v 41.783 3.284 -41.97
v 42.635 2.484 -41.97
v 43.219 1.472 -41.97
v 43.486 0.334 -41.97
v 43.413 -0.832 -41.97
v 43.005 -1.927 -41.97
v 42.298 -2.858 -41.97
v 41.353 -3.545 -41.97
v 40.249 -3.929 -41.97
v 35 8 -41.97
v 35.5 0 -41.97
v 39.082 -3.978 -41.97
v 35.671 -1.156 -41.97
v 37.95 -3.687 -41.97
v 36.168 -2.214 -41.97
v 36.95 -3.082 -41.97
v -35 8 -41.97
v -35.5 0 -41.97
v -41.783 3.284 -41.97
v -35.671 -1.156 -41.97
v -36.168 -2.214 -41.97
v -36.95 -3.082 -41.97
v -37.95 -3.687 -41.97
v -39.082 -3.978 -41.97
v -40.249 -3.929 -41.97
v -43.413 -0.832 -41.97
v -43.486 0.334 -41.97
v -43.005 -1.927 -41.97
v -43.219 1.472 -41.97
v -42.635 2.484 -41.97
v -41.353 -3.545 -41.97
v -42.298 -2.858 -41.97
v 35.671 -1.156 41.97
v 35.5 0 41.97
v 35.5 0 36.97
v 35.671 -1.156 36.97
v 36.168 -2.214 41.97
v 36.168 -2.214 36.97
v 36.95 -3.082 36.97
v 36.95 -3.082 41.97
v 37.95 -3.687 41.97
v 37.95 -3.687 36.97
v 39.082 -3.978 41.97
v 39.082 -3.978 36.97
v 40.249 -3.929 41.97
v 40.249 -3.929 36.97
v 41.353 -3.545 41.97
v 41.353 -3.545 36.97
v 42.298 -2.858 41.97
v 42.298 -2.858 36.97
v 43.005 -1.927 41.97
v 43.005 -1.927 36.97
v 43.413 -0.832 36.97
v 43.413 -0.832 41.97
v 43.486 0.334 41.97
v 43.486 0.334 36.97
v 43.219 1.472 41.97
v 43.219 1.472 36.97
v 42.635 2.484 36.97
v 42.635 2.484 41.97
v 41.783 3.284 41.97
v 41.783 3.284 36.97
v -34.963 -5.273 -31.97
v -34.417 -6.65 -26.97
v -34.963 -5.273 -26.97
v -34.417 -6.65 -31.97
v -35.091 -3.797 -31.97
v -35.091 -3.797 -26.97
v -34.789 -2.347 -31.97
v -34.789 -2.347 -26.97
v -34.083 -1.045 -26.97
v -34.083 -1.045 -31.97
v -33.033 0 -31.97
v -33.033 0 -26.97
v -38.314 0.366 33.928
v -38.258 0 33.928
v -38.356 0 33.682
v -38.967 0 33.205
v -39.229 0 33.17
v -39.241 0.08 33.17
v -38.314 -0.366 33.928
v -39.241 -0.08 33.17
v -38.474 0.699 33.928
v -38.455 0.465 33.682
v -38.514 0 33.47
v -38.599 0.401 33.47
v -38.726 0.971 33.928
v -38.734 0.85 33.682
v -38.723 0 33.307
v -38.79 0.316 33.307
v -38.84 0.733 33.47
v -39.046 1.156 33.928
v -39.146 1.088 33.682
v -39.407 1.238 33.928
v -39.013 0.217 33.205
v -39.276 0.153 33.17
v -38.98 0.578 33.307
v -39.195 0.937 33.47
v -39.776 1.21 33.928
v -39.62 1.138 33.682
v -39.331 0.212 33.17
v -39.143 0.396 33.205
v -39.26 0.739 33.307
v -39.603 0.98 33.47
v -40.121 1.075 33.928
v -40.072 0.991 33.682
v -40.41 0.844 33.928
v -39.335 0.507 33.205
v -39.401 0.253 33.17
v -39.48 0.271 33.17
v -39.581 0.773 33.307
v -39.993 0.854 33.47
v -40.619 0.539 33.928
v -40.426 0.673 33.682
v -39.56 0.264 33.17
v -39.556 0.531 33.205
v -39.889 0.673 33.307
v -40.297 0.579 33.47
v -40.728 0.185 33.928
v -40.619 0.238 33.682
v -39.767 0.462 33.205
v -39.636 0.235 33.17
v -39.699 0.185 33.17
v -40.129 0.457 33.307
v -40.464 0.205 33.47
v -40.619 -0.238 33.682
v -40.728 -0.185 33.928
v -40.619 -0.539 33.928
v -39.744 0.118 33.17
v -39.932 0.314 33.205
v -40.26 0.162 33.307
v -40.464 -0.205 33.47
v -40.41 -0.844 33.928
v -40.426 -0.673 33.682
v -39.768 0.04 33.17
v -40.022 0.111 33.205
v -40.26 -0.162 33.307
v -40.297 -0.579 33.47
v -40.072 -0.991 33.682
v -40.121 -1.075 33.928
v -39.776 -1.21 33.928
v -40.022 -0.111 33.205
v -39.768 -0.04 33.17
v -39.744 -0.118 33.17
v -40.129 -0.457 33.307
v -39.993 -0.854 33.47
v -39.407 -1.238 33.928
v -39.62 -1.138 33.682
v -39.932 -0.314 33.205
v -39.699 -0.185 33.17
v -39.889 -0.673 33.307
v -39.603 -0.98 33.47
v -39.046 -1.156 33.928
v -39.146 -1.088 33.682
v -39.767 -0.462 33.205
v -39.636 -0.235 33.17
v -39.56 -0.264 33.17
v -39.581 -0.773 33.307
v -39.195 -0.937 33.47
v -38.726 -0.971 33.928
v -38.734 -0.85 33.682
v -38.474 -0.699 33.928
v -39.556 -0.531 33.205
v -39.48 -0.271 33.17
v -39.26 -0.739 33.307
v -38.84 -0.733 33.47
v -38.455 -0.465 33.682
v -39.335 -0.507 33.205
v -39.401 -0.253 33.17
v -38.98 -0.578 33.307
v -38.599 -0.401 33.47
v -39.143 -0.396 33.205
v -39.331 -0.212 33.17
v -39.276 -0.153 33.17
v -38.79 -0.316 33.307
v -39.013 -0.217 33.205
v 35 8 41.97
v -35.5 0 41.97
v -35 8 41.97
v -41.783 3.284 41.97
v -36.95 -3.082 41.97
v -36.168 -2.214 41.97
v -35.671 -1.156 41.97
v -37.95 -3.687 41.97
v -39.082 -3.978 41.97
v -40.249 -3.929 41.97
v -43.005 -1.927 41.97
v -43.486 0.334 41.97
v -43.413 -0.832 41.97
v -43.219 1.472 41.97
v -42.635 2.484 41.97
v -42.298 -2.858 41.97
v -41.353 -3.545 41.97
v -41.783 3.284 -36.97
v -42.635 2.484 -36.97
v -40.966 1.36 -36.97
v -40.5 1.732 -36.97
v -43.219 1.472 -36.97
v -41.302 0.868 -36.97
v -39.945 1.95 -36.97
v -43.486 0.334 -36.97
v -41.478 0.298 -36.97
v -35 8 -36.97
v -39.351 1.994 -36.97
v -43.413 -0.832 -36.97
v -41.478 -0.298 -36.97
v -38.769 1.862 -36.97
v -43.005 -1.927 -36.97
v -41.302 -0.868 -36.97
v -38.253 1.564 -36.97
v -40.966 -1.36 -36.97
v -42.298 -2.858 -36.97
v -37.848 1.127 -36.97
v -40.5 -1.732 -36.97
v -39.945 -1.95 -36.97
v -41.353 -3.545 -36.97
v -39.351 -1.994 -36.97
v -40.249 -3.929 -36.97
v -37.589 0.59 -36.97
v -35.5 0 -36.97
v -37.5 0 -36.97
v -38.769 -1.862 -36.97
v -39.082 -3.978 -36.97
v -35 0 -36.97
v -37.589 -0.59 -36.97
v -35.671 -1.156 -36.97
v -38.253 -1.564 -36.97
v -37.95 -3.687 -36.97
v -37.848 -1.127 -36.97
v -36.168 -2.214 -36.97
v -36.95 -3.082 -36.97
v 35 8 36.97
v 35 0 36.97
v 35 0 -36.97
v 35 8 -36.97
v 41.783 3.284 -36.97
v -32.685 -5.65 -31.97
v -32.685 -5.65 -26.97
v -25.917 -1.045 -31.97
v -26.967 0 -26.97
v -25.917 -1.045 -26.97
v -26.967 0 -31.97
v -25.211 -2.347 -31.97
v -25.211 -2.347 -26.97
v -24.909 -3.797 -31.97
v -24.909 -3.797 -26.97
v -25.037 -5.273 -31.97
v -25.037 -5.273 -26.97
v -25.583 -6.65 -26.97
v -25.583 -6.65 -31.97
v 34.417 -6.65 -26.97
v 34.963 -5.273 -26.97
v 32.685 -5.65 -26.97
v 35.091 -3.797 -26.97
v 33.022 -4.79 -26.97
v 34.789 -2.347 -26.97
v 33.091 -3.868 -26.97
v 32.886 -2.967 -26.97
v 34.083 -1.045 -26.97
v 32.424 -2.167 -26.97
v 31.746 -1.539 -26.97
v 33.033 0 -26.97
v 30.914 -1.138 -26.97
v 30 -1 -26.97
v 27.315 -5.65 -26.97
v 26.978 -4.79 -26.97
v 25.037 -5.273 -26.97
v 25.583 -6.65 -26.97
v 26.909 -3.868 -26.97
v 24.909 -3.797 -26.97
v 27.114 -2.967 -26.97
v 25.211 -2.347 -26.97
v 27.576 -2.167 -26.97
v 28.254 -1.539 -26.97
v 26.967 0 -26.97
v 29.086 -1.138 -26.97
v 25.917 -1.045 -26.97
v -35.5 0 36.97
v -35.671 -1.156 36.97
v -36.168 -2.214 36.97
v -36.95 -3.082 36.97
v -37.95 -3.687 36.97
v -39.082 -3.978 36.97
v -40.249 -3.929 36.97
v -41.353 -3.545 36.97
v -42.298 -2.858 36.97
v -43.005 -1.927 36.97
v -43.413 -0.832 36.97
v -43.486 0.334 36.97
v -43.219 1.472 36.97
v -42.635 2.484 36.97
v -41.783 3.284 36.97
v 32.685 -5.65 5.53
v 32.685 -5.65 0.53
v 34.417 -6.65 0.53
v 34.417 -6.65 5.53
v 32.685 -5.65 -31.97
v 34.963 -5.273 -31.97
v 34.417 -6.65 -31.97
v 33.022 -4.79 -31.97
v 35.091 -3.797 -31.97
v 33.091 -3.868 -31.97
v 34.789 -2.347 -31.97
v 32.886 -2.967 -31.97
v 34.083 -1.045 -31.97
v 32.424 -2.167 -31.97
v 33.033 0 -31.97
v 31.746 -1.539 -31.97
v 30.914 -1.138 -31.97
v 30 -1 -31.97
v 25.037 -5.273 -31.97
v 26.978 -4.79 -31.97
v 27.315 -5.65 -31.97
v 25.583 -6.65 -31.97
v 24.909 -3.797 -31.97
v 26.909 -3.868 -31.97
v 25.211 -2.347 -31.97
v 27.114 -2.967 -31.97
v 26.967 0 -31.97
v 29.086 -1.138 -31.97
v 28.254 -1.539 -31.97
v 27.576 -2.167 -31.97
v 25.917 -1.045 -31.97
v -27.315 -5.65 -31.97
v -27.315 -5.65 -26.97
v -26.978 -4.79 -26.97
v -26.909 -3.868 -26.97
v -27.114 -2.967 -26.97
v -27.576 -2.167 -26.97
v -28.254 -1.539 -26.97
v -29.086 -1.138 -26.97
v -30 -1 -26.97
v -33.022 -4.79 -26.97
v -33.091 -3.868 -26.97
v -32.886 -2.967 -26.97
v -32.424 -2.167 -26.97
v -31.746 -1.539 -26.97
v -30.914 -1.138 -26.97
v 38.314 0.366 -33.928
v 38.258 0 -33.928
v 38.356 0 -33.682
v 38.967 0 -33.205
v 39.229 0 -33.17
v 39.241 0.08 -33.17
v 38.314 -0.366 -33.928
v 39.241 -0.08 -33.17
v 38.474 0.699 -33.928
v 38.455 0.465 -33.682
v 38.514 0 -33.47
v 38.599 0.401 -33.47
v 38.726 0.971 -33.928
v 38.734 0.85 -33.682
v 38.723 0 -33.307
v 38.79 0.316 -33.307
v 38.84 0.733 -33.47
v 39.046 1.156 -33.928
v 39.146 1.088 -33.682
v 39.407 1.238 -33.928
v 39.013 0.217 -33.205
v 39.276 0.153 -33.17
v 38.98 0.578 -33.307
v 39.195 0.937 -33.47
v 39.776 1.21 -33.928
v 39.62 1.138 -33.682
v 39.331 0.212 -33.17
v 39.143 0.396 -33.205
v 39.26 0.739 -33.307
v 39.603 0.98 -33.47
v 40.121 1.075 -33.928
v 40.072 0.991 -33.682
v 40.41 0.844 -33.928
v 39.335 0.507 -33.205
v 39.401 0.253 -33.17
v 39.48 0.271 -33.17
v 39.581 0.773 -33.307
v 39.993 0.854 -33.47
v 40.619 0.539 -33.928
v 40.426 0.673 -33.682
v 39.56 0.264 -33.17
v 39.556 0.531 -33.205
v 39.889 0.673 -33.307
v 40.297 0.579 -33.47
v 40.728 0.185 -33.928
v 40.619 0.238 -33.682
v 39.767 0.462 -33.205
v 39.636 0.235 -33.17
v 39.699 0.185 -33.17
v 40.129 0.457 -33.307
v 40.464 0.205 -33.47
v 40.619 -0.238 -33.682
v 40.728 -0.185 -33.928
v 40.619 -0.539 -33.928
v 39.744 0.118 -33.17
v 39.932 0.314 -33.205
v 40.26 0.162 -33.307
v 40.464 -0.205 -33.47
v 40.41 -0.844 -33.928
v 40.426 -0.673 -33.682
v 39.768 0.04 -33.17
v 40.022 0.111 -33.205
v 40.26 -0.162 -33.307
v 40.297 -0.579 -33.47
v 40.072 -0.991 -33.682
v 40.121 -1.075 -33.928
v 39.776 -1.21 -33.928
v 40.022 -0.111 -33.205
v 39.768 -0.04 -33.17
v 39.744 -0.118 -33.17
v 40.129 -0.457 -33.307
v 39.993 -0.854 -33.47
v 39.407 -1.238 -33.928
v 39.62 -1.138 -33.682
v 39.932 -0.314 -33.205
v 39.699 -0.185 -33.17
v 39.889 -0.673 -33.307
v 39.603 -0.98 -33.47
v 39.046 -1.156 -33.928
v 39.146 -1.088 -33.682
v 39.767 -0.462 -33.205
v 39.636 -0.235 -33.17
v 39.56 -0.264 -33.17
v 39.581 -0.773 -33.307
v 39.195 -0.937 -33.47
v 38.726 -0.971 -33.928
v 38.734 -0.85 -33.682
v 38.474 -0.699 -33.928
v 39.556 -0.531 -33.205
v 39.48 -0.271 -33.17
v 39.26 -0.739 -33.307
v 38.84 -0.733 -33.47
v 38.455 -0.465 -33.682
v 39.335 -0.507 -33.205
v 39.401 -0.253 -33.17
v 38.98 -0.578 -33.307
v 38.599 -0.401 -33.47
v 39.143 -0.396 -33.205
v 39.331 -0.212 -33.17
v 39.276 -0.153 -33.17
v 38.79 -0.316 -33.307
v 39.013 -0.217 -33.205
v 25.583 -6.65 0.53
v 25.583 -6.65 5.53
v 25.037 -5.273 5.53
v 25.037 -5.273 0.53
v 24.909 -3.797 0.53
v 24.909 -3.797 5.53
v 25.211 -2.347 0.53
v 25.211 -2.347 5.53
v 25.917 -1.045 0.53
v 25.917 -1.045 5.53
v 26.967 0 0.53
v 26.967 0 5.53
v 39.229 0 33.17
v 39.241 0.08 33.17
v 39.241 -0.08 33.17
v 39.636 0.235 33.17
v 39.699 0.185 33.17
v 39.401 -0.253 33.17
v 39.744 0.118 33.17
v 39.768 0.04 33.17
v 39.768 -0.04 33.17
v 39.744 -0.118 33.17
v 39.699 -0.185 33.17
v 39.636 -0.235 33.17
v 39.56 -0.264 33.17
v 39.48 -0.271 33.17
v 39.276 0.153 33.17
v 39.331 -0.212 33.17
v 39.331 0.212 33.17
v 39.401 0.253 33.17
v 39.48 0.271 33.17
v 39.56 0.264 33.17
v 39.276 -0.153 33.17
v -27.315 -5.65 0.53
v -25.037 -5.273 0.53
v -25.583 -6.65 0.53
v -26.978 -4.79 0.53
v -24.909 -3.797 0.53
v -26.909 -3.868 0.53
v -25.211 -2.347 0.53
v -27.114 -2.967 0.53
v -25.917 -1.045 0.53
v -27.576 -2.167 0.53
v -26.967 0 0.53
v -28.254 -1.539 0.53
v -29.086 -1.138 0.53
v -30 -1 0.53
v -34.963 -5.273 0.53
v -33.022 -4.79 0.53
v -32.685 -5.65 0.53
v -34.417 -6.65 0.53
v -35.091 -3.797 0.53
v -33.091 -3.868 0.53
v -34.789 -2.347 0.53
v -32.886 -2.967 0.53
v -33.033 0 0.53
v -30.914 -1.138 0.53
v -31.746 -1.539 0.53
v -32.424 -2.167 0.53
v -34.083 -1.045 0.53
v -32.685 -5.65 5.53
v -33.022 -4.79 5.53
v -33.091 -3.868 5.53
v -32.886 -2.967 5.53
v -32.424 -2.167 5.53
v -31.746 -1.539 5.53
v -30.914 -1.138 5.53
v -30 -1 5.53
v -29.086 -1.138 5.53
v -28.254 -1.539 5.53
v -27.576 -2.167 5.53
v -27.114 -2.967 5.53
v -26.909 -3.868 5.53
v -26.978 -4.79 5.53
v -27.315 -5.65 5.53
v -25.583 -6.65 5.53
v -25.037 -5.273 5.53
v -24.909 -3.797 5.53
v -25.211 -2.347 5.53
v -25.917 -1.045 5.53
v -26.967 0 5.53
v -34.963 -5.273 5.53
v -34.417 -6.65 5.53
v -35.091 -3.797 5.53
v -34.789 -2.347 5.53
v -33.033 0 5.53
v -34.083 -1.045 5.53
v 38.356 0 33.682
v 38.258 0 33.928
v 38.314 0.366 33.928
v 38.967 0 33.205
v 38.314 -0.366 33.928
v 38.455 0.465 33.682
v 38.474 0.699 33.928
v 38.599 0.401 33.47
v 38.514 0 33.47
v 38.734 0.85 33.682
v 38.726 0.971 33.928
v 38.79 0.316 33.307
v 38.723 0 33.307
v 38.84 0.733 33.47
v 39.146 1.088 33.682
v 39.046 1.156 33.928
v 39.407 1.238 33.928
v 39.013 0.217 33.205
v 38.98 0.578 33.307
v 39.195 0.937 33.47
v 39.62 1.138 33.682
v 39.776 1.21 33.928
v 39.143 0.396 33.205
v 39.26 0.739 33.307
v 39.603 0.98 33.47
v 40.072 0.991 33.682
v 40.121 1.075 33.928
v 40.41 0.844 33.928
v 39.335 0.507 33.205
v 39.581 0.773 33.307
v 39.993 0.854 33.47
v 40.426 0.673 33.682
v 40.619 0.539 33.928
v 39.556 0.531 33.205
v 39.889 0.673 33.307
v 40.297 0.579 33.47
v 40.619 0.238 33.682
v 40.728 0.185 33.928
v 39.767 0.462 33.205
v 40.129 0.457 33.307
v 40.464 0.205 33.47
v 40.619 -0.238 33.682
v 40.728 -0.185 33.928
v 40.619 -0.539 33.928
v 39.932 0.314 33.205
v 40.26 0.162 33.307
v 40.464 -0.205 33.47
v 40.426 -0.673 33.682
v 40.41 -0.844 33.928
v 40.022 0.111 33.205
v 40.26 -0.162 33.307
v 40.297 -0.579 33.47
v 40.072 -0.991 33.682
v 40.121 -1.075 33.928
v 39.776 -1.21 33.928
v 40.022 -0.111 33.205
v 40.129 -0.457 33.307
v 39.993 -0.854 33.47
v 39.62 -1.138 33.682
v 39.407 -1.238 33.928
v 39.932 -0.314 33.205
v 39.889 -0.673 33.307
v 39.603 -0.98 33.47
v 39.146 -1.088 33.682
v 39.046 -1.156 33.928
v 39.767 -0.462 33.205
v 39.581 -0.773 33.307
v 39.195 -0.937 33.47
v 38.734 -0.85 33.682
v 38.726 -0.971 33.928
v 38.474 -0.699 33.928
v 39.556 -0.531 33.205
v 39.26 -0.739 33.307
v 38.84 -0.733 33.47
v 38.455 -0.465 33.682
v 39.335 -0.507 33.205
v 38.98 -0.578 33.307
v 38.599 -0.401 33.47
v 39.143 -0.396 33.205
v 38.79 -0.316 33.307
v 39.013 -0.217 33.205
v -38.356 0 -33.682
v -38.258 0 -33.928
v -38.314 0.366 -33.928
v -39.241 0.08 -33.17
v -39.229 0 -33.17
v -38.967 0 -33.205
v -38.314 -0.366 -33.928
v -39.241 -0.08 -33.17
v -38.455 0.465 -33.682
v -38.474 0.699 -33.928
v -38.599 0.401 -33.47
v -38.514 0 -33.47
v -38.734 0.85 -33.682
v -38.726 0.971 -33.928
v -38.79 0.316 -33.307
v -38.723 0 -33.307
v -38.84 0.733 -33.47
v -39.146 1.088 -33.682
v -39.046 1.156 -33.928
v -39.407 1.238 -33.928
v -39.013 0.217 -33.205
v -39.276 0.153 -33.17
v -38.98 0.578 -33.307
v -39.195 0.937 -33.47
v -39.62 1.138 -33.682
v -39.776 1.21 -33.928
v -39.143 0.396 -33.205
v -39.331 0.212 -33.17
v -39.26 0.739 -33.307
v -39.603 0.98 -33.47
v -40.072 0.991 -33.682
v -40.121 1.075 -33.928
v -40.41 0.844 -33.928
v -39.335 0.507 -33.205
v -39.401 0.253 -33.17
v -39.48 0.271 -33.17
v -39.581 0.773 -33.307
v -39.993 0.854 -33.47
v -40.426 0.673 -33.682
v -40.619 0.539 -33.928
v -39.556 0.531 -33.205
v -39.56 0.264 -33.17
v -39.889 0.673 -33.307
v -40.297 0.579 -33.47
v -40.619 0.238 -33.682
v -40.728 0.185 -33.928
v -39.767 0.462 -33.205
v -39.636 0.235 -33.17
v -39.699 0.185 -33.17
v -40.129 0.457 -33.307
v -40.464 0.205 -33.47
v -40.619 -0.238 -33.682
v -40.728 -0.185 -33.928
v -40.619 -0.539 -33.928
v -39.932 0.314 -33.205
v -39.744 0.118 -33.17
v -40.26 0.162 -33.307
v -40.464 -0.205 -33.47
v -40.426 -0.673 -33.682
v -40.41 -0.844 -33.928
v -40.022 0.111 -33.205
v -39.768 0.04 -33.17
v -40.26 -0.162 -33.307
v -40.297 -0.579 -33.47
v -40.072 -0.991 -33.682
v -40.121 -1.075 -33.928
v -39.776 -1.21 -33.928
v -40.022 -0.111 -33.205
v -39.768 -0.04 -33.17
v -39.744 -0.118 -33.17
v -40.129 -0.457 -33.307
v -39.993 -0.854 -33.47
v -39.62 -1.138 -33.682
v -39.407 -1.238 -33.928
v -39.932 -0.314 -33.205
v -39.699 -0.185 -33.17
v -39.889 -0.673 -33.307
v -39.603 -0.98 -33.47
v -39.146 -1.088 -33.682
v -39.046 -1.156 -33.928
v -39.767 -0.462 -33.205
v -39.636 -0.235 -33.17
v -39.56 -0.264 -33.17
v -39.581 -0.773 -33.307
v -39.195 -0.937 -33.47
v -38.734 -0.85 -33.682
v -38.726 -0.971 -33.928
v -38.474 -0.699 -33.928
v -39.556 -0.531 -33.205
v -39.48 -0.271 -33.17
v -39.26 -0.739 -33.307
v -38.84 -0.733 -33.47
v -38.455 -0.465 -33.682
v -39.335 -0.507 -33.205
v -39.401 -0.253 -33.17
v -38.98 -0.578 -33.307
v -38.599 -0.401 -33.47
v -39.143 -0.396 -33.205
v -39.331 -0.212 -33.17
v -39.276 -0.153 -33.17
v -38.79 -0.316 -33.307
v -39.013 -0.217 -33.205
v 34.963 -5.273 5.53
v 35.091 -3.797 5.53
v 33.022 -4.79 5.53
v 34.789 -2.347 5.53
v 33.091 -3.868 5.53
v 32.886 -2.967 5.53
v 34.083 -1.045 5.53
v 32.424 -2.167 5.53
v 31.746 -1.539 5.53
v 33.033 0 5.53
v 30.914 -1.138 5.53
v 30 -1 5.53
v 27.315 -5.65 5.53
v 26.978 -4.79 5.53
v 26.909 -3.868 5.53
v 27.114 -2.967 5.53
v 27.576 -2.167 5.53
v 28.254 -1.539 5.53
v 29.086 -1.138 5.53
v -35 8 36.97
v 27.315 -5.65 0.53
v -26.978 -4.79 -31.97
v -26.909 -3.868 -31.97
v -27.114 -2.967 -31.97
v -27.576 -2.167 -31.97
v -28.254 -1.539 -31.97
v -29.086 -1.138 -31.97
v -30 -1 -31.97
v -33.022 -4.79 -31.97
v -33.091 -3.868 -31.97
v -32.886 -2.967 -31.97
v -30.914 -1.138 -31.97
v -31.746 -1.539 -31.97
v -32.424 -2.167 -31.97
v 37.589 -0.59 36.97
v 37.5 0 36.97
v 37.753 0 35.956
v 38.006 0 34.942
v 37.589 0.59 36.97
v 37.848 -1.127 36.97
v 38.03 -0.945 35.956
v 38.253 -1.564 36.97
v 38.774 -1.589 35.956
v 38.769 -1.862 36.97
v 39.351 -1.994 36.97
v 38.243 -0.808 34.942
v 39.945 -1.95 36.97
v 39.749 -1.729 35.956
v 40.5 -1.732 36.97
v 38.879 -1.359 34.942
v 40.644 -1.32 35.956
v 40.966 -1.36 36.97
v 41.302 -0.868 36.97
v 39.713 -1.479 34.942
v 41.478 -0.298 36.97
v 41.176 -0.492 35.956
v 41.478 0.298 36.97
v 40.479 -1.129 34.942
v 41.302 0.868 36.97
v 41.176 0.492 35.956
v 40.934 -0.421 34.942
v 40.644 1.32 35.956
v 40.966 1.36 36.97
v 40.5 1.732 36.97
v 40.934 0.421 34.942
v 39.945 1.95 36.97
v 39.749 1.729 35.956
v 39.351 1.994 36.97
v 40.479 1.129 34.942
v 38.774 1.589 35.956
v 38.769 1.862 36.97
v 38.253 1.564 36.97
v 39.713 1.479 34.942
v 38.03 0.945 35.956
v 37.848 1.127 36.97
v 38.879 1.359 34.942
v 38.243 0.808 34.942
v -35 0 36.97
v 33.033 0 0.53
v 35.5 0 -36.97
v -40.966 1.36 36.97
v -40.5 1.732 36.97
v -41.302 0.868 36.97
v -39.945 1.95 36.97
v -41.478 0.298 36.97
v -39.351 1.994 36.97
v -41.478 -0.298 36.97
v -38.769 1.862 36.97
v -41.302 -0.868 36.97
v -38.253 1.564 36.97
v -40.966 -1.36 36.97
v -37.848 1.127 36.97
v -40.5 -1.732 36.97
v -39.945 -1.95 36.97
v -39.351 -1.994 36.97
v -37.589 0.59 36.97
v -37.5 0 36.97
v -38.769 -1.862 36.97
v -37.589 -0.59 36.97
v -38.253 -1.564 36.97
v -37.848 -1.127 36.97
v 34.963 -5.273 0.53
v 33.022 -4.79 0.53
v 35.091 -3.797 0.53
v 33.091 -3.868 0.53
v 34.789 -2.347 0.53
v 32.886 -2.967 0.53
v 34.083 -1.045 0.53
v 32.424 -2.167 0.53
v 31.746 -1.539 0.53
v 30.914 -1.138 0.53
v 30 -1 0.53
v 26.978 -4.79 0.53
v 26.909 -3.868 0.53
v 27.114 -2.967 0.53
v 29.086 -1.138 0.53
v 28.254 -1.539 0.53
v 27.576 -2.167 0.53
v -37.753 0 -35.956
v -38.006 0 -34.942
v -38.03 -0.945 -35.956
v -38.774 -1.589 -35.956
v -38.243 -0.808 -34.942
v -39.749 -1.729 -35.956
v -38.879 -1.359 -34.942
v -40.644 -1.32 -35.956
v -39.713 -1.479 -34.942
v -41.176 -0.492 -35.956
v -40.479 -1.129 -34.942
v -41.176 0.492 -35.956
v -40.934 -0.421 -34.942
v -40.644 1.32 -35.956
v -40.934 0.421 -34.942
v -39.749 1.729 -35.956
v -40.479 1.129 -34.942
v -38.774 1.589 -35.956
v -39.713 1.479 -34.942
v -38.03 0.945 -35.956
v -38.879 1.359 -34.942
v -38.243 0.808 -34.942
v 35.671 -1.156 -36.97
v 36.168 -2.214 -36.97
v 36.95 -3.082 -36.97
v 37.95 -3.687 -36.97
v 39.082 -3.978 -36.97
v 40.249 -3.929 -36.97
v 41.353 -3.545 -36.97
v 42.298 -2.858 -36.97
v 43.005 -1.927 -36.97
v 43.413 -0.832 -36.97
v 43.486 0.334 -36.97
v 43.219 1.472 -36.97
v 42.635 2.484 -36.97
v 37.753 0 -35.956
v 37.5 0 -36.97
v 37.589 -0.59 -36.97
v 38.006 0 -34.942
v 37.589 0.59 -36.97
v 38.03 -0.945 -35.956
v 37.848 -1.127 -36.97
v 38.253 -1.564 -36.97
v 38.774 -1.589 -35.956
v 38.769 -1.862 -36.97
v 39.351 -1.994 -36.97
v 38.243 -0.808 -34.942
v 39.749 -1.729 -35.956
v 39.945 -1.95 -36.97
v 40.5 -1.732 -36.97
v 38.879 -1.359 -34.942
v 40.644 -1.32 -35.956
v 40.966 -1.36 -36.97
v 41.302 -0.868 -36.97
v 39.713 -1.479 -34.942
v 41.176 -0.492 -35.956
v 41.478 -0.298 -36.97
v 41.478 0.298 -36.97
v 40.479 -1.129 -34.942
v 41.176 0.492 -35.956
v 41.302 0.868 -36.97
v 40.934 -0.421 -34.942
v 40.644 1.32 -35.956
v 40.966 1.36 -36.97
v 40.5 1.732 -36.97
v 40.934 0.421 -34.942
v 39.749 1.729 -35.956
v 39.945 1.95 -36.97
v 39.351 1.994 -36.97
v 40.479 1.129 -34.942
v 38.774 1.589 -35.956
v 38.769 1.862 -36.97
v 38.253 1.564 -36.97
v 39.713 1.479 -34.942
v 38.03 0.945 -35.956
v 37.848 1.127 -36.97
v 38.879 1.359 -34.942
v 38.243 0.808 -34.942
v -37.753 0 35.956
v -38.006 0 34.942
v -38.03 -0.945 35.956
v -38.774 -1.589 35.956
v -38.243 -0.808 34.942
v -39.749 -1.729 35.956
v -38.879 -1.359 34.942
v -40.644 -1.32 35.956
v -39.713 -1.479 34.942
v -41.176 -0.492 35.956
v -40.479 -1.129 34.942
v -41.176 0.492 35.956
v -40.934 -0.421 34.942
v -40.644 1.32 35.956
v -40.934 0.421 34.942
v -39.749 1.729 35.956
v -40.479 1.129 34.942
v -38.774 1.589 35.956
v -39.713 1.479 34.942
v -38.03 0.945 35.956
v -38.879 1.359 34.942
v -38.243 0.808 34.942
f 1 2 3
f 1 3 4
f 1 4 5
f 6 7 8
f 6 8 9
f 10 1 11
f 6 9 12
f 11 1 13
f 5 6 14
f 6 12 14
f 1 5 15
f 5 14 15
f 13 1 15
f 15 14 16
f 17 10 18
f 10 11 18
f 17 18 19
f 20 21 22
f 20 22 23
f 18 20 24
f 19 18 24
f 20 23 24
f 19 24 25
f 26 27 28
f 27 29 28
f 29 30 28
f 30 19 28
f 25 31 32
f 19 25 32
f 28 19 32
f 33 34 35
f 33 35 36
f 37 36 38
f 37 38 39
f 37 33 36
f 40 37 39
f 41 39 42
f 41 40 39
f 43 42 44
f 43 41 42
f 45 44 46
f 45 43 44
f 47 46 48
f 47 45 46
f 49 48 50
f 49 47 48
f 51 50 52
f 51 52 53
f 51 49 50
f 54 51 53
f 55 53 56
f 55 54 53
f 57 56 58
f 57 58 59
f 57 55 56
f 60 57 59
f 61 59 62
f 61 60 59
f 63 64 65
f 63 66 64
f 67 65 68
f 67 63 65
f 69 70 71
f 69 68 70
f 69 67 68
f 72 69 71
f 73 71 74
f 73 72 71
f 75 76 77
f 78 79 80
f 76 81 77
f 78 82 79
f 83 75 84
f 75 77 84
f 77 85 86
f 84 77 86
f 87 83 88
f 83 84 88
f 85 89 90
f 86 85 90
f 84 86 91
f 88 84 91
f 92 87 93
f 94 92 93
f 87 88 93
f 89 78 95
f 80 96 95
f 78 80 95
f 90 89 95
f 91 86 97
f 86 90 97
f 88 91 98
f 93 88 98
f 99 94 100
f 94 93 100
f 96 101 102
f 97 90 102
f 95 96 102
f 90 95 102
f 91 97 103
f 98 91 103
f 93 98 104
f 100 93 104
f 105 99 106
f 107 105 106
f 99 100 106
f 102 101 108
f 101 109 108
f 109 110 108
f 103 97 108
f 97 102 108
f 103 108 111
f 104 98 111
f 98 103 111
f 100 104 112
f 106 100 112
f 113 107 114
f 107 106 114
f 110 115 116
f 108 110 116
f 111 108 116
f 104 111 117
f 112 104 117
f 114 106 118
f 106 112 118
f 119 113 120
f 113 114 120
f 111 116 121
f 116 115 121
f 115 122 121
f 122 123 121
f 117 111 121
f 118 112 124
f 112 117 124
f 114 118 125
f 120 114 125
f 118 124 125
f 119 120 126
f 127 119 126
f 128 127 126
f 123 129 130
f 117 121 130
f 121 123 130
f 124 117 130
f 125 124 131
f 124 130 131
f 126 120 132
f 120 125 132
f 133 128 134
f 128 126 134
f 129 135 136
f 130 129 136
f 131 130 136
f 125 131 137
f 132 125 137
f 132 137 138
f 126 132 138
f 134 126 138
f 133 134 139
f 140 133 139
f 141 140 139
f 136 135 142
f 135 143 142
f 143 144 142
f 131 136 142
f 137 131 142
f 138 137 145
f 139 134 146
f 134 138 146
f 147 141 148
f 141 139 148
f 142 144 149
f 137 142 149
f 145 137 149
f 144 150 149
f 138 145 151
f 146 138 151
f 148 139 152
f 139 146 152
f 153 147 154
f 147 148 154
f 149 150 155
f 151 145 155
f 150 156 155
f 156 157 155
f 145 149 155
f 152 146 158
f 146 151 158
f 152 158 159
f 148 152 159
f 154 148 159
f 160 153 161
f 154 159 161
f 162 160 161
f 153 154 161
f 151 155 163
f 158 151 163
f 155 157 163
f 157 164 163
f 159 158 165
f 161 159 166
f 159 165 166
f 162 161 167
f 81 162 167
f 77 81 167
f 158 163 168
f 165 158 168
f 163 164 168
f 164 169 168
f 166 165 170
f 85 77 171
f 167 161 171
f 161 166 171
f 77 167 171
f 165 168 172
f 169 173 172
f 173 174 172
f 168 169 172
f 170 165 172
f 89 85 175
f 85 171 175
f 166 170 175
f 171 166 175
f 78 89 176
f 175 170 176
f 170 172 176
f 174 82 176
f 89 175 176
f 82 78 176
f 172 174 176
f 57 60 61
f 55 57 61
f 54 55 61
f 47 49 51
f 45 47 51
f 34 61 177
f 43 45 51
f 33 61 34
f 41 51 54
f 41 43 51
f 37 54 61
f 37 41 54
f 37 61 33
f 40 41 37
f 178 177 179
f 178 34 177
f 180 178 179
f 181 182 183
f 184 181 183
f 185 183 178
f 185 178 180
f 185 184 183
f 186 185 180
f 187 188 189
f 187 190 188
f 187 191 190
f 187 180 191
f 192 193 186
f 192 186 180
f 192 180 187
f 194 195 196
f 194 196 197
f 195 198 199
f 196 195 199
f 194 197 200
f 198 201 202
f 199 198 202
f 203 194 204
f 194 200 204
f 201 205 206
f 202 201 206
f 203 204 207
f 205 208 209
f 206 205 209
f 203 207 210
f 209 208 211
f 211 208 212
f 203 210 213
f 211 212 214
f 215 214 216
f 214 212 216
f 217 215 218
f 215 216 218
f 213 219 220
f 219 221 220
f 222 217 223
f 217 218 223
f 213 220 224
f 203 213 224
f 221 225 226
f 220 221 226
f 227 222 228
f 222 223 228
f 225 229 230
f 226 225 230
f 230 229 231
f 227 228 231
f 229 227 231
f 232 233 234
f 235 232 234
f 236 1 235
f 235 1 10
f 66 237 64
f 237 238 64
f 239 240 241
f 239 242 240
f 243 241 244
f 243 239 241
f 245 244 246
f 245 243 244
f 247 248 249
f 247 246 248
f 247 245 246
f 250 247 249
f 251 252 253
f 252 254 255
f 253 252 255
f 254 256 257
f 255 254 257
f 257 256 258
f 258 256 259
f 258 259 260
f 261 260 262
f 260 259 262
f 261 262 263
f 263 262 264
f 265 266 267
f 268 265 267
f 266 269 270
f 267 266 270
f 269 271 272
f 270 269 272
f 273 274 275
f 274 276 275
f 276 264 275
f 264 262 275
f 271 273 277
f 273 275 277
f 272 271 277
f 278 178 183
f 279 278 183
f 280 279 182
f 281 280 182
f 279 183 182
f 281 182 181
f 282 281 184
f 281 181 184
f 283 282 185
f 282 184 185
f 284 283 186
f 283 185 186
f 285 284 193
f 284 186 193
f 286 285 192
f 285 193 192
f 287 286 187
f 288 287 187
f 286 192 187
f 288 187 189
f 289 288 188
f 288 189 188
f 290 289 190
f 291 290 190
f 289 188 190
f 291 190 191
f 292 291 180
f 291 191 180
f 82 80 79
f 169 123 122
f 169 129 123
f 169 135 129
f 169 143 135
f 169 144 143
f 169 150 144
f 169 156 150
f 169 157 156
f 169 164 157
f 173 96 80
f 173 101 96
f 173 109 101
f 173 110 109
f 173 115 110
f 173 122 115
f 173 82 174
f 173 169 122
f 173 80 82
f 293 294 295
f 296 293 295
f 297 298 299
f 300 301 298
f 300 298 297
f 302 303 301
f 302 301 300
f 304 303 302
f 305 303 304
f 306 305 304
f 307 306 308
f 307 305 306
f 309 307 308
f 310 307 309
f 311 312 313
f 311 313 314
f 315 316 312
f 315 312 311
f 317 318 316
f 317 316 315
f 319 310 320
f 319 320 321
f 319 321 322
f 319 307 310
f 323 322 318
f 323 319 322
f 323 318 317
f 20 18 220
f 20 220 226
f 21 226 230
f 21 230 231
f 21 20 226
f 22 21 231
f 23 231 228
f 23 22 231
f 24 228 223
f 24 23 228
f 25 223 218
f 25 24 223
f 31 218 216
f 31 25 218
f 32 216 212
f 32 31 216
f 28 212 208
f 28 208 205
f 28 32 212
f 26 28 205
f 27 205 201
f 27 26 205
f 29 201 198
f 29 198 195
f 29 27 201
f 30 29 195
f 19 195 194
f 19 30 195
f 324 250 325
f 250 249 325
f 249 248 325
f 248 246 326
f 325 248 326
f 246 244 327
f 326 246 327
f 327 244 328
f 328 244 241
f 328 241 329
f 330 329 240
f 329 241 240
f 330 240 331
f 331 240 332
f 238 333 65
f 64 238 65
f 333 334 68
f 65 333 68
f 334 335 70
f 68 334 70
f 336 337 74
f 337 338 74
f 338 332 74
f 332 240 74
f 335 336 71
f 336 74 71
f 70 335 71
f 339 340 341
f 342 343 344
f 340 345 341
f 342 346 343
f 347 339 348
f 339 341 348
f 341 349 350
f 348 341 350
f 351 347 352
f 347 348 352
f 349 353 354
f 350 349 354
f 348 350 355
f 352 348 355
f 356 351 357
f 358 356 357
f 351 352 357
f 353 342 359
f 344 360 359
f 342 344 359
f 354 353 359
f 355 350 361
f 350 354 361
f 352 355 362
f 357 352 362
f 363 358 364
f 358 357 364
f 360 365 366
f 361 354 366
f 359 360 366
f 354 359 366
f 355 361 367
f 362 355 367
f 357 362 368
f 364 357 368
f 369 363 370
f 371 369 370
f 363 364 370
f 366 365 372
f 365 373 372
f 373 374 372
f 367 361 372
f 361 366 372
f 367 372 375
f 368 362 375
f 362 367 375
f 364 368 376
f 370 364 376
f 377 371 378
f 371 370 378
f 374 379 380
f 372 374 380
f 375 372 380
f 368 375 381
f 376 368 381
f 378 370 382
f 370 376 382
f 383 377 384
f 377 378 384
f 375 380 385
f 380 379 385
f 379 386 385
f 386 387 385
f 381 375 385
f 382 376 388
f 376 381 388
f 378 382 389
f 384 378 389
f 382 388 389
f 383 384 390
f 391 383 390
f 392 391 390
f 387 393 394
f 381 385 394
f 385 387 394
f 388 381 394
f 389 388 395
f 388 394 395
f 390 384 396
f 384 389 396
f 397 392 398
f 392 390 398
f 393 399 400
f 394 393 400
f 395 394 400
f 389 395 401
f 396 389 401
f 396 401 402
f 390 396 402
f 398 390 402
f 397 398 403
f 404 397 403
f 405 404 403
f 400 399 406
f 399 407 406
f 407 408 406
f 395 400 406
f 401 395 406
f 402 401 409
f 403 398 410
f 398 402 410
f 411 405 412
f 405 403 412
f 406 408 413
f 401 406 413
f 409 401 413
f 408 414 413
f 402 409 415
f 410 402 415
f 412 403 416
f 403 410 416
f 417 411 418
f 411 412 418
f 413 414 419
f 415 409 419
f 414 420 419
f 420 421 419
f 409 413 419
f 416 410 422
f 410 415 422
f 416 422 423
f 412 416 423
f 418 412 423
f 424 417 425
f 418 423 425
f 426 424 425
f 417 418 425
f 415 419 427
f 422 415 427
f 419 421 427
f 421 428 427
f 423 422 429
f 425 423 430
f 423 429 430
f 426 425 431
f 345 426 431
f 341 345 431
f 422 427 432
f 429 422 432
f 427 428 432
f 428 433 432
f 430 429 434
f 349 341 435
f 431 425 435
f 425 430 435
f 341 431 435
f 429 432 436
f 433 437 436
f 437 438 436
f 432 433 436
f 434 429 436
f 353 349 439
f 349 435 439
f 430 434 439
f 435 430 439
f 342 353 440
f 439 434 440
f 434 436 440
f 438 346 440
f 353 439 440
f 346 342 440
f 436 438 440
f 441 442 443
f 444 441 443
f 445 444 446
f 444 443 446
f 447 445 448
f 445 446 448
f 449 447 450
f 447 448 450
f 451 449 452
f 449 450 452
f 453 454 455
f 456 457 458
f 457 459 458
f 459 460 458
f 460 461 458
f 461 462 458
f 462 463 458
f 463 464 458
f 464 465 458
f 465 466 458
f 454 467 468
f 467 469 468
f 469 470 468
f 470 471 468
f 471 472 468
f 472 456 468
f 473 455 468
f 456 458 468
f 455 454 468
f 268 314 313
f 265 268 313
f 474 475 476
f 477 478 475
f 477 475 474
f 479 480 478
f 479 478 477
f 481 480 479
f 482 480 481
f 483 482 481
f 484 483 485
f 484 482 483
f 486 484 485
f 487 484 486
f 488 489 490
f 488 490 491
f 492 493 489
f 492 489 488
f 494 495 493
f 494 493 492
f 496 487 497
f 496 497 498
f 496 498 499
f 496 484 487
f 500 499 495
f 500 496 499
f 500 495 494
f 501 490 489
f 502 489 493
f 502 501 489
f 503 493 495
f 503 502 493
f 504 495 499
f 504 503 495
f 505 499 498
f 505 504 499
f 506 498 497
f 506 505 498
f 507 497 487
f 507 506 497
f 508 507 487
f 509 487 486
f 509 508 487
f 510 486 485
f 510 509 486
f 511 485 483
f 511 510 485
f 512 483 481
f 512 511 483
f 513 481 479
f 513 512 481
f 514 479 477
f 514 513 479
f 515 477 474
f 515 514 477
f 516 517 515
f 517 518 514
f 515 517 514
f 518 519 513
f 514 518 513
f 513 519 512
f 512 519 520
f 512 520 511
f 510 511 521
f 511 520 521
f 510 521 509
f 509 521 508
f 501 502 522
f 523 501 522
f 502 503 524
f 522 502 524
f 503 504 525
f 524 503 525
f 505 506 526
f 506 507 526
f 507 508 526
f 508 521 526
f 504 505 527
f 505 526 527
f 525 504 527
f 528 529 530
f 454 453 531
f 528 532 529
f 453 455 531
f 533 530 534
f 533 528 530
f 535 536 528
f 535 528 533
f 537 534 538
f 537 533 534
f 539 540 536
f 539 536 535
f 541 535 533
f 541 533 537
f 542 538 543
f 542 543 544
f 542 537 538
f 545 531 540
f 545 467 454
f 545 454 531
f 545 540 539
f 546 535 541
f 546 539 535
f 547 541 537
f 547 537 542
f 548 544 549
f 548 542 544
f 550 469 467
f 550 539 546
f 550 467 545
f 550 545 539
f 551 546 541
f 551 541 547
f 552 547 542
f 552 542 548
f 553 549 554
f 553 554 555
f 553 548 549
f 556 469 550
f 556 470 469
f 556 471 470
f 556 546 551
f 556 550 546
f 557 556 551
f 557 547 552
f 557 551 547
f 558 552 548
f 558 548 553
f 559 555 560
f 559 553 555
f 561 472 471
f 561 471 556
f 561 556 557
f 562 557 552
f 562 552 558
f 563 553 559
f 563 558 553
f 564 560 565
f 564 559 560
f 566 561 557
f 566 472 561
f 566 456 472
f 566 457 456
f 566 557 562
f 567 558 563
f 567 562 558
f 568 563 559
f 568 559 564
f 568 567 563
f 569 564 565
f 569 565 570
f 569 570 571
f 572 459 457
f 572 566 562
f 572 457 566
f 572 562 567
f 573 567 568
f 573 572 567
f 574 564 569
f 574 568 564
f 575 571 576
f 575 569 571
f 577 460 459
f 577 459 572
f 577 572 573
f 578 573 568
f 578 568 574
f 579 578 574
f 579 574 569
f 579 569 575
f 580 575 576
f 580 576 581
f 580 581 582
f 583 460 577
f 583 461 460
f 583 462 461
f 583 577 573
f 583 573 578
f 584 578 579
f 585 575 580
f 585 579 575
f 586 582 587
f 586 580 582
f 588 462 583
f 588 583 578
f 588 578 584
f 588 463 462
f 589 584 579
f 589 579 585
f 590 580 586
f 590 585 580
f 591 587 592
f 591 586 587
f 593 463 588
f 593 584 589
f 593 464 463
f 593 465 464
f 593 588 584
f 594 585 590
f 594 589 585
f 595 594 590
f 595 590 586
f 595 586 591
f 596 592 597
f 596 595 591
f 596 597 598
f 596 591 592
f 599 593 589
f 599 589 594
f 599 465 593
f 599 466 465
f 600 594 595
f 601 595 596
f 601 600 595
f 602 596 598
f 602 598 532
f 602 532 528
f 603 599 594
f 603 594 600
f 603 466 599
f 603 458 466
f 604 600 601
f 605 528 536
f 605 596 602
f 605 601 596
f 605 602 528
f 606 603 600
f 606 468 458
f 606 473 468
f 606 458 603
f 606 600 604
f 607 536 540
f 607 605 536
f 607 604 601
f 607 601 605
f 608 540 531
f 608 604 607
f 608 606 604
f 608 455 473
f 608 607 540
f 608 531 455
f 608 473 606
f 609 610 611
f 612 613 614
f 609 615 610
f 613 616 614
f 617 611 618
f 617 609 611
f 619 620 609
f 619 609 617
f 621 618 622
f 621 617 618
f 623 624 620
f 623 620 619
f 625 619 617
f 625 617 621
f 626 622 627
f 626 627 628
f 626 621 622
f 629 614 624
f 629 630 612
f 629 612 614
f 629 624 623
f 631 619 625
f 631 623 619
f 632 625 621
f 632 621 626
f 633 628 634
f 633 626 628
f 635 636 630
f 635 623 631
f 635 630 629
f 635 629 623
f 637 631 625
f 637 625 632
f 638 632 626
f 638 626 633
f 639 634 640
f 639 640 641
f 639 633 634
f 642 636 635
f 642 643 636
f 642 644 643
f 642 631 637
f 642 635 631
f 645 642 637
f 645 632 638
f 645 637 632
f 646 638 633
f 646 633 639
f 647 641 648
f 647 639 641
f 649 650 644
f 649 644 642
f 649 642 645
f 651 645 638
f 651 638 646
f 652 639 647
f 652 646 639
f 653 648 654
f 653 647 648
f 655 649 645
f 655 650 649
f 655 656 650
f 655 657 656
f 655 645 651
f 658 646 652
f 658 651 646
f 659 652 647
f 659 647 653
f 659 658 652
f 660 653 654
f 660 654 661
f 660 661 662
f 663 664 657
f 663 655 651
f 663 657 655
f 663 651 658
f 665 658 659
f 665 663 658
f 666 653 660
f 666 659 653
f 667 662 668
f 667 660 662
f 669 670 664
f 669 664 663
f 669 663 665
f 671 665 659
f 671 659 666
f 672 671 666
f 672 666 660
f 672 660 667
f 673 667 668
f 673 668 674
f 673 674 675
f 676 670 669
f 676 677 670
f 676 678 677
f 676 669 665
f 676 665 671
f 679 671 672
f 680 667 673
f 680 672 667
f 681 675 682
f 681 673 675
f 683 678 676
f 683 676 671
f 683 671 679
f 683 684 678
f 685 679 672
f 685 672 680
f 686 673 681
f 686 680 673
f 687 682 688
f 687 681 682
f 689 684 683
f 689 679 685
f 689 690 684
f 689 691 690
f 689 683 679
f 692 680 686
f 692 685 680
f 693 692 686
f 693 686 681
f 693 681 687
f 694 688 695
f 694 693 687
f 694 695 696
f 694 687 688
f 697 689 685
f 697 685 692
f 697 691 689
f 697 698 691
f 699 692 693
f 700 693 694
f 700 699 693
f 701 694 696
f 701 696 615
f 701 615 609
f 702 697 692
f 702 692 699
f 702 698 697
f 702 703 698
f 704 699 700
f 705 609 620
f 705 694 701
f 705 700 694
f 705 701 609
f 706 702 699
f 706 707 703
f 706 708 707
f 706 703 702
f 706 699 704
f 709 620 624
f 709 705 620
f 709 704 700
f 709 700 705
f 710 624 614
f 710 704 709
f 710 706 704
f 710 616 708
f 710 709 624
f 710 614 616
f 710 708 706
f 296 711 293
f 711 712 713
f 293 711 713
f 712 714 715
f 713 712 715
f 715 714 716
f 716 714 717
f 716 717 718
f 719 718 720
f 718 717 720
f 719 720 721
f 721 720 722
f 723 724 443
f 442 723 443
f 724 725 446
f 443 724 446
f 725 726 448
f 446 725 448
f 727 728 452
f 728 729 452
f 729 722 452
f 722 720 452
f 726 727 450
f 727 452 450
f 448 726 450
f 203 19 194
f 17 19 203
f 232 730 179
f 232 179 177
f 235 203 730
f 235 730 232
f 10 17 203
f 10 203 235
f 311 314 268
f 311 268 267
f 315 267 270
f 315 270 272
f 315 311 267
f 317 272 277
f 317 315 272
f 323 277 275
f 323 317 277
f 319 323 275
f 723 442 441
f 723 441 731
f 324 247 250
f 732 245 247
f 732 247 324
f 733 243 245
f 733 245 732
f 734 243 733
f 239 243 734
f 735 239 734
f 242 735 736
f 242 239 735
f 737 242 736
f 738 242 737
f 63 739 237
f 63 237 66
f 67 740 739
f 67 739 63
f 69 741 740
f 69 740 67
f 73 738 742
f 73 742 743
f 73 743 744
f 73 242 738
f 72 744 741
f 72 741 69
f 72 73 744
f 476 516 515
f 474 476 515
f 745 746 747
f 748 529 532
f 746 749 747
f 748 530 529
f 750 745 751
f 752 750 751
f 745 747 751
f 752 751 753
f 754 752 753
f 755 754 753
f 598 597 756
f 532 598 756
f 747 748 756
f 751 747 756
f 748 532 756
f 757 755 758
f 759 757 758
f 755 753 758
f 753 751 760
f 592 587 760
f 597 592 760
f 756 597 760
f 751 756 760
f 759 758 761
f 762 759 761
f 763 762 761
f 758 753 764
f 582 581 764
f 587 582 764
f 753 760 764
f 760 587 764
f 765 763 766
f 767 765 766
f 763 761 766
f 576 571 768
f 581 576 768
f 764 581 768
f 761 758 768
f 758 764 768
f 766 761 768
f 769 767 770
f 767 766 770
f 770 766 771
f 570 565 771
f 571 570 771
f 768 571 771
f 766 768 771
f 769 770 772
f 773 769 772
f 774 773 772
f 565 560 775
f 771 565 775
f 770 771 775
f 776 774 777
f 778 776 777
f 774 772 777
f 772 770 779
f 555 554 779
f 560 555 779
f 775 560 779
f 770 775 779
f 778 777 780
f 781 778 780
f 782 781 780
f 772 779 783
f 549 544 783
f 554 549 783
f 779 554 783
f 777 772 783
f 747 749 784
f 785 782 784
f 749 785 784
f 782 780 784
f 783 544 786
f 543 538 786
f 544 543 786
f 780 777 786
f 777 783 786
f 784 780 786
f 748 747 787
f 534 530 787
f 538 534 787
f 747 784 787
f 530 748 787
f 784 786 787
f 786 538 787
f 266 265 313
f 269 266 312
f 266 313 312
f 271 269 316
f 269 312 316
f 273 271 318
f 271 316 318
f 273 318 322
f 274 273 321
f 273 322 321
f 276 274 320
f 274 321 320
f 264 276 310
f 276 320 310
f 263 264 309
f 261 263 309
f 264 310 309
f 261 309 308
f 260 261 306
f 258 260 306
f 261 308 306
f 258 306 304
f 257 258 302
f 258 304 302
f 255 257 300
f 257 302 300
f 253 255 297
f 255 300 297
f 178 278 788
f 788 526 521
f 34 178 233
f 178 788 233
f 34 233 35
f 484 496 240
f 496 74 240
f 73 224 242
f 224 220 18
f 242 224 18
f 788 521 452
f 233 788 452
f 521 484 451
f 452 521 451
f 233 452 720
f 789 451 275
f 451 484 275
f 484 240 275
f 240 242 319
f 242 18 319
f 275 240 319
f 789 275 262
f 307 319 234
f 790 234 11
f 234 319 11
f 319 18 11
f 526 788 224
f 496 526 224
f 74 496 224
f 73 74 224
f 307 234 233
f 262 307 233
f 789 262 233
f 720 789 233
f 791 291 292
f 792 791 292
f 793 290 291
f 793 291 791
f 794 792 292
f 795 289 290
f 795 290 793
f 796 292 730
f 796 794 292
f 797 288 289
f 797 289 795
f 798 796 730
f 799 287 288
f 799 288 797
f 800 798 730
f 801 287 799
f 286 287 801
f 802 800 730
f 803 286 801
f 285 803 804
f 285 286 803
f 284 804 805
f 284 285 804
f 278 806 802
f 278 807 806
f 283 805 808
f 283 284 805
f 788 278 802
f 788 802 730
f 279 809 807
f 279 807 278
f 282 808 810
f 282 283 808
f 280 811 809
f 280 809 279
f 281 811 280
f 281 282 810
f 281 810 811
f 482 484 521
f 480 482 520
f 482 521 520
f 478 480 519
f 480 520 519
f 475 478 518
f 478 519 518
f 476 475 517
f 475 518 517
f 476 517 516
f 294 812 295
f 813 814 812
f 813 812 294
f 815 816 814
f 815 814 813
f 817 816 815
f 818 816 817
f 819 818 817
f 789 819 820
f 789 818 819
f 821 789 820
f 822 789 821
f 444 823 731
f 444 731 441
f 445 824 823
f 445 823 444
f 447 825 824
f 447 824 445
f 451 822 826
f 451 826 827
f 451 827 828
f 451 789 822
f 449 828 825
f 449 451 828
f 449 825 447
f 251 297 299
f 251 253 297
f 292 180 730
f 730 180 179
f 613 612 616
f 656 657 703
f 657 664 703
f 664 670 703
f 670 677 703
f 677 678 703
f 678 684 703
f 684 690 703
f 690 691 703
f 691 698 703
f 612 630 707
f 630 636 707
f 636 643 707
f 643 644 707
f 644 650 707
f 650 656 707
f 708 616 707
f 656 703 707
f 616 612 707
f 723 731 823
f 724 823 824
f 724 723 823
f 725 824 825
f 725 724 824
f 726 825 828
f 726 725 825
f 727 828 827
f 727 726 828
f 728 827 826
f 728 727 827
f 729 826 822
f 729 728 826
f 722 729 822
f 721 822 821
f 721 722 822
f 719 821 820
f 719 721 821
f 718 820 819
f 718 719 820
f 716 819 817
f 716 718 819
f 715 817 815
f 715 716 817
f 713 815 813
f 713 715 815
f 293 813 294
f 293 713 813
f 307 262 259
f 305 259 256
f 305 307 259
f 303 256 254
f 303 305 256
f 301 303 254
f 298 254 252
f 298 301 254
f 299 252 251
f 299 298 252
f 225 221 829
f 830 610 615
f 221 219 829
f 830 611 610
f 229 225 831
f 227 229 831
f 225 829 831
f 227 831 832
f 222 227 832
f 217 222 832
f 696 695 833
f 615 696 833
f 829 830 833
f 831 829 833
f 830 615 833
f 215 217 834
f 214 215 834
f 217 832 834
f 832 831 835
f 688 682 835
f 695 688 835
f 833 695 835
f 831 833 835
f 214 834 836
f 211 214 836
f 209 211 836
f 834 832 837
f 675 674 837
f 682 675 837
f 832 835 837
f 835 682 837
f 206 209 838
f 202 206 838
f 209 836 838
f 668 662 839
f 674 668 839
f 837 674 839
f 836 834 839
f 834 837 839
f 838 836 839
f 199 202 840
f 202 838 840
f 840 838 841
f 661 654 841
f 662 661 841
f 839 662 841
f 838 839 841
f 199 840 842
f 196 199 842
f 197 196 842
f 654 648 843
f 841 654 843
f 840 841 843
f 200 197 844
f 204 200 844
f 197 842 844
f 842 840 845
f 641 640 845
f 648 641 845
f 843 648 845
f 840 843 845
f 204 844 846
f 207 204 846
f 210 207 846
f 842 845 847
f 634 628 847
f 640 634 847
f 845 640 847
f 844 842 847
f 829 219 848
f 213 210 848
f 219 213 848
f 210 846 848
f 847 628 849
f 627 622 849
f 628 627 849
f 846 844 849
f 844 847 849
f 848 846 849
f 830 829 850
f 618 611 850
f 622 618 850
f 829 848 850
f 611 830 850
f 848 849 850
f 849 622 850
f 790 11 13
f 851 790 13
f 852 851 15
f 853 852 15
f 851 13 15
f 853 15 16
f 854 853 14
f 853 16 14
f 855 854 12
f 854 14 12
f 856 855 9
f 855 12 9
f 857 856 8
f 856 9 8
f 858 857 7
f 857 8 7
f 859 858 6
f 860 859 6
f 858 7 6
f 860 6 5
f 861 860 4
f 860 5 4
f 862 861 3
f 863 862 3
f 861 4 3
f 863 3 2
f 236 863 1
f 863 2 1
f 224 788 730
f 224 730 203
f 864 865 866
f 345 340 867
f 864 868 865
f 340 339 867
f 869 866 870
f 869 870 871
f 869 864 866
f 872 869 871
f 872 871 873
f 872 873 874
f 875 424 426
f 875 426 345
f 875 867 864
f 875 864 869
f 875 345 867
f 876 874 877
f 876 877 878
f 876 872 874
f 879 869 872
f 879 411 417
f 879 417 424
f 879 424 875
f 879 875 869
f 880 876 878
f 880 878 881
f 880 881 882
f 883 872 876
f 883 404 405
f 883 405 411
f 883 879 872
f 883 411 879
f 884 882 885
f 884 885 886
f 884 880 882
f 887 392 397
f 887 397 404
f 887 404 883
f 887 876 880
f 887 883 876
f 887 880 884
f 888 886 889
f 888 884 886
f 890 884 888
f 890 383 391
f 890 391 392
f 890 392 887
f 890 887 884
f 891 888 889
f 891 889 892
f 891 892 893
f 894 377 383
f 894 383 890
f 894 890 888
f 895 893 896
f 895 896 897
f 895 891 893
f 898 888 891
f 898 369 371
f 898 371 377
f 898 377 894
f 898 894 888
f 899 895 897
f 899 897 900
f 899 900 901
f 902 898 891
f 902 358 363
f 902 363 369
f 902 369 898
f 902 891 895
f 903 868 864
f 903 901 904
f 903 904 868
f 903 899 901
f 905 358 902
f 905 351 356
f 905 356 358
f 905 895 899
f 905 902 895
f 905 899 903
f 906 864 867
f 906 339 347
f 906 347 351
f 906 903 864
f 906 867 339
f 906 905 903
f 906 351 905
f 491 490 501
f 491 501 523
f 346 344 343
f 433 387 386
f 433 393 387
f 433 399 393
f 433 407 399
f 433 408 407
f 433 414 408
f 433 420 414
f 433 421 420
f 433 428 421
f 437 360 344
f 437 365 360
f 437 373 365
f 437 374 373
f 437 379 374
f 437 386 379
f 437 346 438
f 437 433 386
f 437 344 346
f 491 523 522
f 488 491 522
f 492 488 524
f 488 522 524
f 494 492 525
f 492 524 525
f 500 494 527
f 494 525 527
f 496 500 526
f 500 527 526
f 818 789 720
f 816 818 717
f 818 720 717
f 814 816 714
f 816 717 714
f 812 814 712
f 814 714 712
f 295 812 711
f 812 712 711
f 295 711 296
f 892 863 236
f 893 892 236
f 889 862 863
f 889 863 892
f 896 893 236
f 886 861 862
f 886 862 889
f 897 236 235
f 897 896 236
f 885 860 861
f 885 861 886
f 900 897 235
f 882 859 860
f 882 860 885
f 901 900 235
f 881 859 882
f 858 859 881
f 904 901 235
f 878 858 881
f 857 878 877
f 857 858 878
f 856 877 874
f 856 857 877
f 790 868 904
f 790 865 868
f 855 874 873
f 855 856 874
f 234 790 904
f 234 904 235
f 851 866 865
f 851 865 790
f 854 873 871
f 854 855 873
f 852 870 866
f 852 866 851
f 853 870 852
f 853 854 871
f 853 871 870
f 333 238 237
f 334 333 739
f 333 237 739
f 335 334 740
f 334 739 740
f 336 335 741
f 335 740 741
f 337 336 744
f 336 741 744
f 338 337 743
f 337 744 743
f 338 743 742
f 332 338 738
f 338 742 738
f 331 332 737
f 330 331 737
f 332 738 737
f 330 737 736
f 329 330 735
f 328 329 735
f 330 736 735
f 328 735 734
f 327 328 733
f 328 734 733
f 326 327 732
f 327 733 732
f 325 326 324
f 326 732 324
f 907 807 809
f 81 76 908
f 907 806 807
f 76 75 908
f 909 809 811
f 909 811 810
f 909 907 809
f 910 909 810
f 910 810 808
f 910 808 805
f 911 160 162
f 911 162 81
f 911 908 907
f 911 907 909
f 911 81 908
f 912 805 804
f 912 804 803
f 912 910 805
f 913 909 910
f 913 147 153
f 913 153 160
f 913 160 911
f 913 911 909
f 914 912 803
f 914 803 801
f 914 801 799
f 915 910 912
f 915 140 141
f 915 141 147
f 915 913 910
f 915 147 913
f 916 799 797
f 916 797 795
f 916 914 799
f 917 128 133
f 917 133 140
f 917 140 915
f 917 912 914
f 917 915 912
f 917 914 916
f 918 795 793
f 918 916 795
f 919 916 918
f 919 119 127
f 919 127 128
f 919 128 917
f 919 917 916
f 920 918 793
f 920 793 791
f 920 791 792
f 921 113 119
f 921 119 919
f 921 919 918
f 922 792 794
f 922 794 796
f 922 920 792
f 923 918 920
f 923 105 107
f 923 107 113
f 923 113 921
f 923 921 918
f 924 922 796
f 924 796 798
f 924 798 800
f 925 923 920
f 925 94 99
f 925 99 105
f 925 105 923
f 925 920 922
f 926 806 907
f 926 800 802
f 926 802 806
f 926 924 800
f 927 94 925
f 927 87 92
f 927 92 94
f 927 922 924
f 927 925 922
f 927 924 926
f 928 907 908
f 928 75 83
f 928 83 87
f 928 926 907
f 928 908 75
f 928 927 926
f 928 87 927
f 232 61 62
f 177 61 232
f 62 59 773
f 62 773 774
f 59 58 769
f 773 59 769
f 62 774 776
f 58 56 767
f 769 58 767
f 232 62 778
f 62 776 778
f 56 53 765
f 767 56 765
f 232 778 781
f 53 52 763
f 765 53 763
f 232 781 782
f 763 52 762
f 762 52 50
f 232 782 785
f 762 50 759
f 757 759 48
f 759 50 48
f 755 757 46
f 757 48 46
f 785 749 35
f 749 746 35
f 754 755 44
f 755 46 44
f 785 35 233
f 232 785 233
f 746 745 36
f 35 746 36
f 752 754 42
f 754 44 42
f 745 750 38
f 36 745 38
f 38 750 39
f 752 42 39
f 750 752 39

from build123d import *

# Parameters (mm, degrees)
SKETCH1_W           = 70
SKETCH1_H           = 83.94
BOSS_EXTRUDE1_DEPTH = 8
BOSS_EXTRUDE2_START = -10
SKETCH3_R           = 5.1
SKETCH3_R_2         = 3.1
BOSS_EXTRUDE2_DEPTH = 5
CUT_EXTRUDE1_DEPTH  = 63
BOSS_EXTRUDE3_DEPTH = 5
SKETCH6_R           = 2
BOSS_EXTRUDE4_DEPTH = 3.8
BOSS_EXTRUDE4_TAPER = 14
FILLET1_R           = 1


with BuildPart() as part:
    # Sketch1 → Boss-Extrude1 (new body)
    with BuildSketch(Plane(origin=(0, 0, 0), x_dir=(1, 0, 0), z_dir=(0, 1, 0))):
        Rectangle(SKETCH1_W, SKETCH1_H)
    extrude(amount=BOSS_EXTRUDE1_DEPTH)

    # Sketch3 → Boss-Extrude2 (add)
    # profile 1 of 2: a face of its own
    with BuildSketch(Plane(origin=(0, 0, -41.97), x_dir=(-1, 0, 0), z_dir=(0, 0, -1)).offset(BOSS_EXTRUDE2_START)):
        with Locations((-30, -4.1)):
            Circle(SKETCH3_R)
        with Locations((-30, -4.1)):
            Circle(SKETCH3_R_2, mode=Mode.SUBTRACT)
    # profile 2 of 2: a face of its own
    with BuildSketch(Plane(origin=(0, 0, -41.97), x_dir=(-1, 0, 0), z_dir=(0, 0, -1)).offset(BOSS_EXTRUDE2_START)):
        with Locations((30, -4.1)):
            Circle(SKETCH3_R)
        with Locations((30, -4.1)):
            Circle(SKETCH3_R_2, mode=Mode.SUBTRACT)
    boss_extrude2 = extrude(amount=-BOSS_EXTRUDE2_DEPTH)

    # Mirror1: Boss-Extrude2 across plane
    add(boss_extrude2.mirror(Plane.XY.offset(-13.22)))

    # Sketch4 → Cut-Extrude1 (cut)
    with BuildSketch(Plane.XY.offset(5.53)):
        Polygon((30, -4.1), (40, -9.873502692), (20, -9.873502692), align=None)
        Polygon((-40, -9.873502692), (-20, -9.873502692), (-30, -4.1), align=None)
    extrude(amount=-CUT_EXTRUDE1_DEPTH, mode=Mode.SUBTRACT)


with BuildPart() as body_2:
    # Sketch5 → Boss-Extrude3 (new body)
    with BuildSketch(Plane.XY.offset(41.97)):
        with BuildLine():
            Line((35, 8), (35.5, 8))
            ThreePointArc((35.5, 8), (41.352973318, 11.544924524), (41.783244941, 4.715674721))
            Line((41.783244941, 4.715674721), (35, 0))
            Line((35, 0), (35, 8))
        make_face()
    extrude(amount=-BOSS_EXTRUDE3_DEPTH)

    # Sketch6 → Boss-Extrude4 (add)
    with BuildSketch(Plane(origin=(0, 0, 36.97), x_dir=(-1, 0, 0), z_dir=(0, 0, -1))):
        with Locations((-39.5, 8)):
            Circle(SKETCH6_R)
    extrude(amount=BOSS_EXTRUDE4_DEPTH, taper=BOSS_EXTRUDE4_TAPER)

    # Fillet1
    fillet1_edges = [body_2.edges().sort_by_distance(p)[0] for p in [
        (40.552553589, 8, 33.17),
    ]]
    fillet(fillet1_edges, radius=FILLET1_R)


with BuildPart() as body_3:
    # Mirror2: mirrored copy
    add(body_2.part.mirror(Plane(origin=(0, 4, 0), x_dir=(0, 0, 1), z_dir=(0, -1, 0))))


with BuildPart() as body_3_2:
    # Mirror3: mirrored copy
    add(body_3.part.mirror(Plane.XY))


with BuildPart() as body_4:
    # Mirror4: mirrored copy
    add(body_3.part.mirror(Plane.ZY))


with BuildPart() as body_5:
    # Mirror4 2: mirrored copy
    add(body_3_2.part.mirror(Plane.ZY))

    # Combine1: union part, body 4, body 3, body 3 2
    add(part.part)
    add(body_4.part)
    add(body_3.part)
    add(body_3_2.part)


solid = body_5.part
